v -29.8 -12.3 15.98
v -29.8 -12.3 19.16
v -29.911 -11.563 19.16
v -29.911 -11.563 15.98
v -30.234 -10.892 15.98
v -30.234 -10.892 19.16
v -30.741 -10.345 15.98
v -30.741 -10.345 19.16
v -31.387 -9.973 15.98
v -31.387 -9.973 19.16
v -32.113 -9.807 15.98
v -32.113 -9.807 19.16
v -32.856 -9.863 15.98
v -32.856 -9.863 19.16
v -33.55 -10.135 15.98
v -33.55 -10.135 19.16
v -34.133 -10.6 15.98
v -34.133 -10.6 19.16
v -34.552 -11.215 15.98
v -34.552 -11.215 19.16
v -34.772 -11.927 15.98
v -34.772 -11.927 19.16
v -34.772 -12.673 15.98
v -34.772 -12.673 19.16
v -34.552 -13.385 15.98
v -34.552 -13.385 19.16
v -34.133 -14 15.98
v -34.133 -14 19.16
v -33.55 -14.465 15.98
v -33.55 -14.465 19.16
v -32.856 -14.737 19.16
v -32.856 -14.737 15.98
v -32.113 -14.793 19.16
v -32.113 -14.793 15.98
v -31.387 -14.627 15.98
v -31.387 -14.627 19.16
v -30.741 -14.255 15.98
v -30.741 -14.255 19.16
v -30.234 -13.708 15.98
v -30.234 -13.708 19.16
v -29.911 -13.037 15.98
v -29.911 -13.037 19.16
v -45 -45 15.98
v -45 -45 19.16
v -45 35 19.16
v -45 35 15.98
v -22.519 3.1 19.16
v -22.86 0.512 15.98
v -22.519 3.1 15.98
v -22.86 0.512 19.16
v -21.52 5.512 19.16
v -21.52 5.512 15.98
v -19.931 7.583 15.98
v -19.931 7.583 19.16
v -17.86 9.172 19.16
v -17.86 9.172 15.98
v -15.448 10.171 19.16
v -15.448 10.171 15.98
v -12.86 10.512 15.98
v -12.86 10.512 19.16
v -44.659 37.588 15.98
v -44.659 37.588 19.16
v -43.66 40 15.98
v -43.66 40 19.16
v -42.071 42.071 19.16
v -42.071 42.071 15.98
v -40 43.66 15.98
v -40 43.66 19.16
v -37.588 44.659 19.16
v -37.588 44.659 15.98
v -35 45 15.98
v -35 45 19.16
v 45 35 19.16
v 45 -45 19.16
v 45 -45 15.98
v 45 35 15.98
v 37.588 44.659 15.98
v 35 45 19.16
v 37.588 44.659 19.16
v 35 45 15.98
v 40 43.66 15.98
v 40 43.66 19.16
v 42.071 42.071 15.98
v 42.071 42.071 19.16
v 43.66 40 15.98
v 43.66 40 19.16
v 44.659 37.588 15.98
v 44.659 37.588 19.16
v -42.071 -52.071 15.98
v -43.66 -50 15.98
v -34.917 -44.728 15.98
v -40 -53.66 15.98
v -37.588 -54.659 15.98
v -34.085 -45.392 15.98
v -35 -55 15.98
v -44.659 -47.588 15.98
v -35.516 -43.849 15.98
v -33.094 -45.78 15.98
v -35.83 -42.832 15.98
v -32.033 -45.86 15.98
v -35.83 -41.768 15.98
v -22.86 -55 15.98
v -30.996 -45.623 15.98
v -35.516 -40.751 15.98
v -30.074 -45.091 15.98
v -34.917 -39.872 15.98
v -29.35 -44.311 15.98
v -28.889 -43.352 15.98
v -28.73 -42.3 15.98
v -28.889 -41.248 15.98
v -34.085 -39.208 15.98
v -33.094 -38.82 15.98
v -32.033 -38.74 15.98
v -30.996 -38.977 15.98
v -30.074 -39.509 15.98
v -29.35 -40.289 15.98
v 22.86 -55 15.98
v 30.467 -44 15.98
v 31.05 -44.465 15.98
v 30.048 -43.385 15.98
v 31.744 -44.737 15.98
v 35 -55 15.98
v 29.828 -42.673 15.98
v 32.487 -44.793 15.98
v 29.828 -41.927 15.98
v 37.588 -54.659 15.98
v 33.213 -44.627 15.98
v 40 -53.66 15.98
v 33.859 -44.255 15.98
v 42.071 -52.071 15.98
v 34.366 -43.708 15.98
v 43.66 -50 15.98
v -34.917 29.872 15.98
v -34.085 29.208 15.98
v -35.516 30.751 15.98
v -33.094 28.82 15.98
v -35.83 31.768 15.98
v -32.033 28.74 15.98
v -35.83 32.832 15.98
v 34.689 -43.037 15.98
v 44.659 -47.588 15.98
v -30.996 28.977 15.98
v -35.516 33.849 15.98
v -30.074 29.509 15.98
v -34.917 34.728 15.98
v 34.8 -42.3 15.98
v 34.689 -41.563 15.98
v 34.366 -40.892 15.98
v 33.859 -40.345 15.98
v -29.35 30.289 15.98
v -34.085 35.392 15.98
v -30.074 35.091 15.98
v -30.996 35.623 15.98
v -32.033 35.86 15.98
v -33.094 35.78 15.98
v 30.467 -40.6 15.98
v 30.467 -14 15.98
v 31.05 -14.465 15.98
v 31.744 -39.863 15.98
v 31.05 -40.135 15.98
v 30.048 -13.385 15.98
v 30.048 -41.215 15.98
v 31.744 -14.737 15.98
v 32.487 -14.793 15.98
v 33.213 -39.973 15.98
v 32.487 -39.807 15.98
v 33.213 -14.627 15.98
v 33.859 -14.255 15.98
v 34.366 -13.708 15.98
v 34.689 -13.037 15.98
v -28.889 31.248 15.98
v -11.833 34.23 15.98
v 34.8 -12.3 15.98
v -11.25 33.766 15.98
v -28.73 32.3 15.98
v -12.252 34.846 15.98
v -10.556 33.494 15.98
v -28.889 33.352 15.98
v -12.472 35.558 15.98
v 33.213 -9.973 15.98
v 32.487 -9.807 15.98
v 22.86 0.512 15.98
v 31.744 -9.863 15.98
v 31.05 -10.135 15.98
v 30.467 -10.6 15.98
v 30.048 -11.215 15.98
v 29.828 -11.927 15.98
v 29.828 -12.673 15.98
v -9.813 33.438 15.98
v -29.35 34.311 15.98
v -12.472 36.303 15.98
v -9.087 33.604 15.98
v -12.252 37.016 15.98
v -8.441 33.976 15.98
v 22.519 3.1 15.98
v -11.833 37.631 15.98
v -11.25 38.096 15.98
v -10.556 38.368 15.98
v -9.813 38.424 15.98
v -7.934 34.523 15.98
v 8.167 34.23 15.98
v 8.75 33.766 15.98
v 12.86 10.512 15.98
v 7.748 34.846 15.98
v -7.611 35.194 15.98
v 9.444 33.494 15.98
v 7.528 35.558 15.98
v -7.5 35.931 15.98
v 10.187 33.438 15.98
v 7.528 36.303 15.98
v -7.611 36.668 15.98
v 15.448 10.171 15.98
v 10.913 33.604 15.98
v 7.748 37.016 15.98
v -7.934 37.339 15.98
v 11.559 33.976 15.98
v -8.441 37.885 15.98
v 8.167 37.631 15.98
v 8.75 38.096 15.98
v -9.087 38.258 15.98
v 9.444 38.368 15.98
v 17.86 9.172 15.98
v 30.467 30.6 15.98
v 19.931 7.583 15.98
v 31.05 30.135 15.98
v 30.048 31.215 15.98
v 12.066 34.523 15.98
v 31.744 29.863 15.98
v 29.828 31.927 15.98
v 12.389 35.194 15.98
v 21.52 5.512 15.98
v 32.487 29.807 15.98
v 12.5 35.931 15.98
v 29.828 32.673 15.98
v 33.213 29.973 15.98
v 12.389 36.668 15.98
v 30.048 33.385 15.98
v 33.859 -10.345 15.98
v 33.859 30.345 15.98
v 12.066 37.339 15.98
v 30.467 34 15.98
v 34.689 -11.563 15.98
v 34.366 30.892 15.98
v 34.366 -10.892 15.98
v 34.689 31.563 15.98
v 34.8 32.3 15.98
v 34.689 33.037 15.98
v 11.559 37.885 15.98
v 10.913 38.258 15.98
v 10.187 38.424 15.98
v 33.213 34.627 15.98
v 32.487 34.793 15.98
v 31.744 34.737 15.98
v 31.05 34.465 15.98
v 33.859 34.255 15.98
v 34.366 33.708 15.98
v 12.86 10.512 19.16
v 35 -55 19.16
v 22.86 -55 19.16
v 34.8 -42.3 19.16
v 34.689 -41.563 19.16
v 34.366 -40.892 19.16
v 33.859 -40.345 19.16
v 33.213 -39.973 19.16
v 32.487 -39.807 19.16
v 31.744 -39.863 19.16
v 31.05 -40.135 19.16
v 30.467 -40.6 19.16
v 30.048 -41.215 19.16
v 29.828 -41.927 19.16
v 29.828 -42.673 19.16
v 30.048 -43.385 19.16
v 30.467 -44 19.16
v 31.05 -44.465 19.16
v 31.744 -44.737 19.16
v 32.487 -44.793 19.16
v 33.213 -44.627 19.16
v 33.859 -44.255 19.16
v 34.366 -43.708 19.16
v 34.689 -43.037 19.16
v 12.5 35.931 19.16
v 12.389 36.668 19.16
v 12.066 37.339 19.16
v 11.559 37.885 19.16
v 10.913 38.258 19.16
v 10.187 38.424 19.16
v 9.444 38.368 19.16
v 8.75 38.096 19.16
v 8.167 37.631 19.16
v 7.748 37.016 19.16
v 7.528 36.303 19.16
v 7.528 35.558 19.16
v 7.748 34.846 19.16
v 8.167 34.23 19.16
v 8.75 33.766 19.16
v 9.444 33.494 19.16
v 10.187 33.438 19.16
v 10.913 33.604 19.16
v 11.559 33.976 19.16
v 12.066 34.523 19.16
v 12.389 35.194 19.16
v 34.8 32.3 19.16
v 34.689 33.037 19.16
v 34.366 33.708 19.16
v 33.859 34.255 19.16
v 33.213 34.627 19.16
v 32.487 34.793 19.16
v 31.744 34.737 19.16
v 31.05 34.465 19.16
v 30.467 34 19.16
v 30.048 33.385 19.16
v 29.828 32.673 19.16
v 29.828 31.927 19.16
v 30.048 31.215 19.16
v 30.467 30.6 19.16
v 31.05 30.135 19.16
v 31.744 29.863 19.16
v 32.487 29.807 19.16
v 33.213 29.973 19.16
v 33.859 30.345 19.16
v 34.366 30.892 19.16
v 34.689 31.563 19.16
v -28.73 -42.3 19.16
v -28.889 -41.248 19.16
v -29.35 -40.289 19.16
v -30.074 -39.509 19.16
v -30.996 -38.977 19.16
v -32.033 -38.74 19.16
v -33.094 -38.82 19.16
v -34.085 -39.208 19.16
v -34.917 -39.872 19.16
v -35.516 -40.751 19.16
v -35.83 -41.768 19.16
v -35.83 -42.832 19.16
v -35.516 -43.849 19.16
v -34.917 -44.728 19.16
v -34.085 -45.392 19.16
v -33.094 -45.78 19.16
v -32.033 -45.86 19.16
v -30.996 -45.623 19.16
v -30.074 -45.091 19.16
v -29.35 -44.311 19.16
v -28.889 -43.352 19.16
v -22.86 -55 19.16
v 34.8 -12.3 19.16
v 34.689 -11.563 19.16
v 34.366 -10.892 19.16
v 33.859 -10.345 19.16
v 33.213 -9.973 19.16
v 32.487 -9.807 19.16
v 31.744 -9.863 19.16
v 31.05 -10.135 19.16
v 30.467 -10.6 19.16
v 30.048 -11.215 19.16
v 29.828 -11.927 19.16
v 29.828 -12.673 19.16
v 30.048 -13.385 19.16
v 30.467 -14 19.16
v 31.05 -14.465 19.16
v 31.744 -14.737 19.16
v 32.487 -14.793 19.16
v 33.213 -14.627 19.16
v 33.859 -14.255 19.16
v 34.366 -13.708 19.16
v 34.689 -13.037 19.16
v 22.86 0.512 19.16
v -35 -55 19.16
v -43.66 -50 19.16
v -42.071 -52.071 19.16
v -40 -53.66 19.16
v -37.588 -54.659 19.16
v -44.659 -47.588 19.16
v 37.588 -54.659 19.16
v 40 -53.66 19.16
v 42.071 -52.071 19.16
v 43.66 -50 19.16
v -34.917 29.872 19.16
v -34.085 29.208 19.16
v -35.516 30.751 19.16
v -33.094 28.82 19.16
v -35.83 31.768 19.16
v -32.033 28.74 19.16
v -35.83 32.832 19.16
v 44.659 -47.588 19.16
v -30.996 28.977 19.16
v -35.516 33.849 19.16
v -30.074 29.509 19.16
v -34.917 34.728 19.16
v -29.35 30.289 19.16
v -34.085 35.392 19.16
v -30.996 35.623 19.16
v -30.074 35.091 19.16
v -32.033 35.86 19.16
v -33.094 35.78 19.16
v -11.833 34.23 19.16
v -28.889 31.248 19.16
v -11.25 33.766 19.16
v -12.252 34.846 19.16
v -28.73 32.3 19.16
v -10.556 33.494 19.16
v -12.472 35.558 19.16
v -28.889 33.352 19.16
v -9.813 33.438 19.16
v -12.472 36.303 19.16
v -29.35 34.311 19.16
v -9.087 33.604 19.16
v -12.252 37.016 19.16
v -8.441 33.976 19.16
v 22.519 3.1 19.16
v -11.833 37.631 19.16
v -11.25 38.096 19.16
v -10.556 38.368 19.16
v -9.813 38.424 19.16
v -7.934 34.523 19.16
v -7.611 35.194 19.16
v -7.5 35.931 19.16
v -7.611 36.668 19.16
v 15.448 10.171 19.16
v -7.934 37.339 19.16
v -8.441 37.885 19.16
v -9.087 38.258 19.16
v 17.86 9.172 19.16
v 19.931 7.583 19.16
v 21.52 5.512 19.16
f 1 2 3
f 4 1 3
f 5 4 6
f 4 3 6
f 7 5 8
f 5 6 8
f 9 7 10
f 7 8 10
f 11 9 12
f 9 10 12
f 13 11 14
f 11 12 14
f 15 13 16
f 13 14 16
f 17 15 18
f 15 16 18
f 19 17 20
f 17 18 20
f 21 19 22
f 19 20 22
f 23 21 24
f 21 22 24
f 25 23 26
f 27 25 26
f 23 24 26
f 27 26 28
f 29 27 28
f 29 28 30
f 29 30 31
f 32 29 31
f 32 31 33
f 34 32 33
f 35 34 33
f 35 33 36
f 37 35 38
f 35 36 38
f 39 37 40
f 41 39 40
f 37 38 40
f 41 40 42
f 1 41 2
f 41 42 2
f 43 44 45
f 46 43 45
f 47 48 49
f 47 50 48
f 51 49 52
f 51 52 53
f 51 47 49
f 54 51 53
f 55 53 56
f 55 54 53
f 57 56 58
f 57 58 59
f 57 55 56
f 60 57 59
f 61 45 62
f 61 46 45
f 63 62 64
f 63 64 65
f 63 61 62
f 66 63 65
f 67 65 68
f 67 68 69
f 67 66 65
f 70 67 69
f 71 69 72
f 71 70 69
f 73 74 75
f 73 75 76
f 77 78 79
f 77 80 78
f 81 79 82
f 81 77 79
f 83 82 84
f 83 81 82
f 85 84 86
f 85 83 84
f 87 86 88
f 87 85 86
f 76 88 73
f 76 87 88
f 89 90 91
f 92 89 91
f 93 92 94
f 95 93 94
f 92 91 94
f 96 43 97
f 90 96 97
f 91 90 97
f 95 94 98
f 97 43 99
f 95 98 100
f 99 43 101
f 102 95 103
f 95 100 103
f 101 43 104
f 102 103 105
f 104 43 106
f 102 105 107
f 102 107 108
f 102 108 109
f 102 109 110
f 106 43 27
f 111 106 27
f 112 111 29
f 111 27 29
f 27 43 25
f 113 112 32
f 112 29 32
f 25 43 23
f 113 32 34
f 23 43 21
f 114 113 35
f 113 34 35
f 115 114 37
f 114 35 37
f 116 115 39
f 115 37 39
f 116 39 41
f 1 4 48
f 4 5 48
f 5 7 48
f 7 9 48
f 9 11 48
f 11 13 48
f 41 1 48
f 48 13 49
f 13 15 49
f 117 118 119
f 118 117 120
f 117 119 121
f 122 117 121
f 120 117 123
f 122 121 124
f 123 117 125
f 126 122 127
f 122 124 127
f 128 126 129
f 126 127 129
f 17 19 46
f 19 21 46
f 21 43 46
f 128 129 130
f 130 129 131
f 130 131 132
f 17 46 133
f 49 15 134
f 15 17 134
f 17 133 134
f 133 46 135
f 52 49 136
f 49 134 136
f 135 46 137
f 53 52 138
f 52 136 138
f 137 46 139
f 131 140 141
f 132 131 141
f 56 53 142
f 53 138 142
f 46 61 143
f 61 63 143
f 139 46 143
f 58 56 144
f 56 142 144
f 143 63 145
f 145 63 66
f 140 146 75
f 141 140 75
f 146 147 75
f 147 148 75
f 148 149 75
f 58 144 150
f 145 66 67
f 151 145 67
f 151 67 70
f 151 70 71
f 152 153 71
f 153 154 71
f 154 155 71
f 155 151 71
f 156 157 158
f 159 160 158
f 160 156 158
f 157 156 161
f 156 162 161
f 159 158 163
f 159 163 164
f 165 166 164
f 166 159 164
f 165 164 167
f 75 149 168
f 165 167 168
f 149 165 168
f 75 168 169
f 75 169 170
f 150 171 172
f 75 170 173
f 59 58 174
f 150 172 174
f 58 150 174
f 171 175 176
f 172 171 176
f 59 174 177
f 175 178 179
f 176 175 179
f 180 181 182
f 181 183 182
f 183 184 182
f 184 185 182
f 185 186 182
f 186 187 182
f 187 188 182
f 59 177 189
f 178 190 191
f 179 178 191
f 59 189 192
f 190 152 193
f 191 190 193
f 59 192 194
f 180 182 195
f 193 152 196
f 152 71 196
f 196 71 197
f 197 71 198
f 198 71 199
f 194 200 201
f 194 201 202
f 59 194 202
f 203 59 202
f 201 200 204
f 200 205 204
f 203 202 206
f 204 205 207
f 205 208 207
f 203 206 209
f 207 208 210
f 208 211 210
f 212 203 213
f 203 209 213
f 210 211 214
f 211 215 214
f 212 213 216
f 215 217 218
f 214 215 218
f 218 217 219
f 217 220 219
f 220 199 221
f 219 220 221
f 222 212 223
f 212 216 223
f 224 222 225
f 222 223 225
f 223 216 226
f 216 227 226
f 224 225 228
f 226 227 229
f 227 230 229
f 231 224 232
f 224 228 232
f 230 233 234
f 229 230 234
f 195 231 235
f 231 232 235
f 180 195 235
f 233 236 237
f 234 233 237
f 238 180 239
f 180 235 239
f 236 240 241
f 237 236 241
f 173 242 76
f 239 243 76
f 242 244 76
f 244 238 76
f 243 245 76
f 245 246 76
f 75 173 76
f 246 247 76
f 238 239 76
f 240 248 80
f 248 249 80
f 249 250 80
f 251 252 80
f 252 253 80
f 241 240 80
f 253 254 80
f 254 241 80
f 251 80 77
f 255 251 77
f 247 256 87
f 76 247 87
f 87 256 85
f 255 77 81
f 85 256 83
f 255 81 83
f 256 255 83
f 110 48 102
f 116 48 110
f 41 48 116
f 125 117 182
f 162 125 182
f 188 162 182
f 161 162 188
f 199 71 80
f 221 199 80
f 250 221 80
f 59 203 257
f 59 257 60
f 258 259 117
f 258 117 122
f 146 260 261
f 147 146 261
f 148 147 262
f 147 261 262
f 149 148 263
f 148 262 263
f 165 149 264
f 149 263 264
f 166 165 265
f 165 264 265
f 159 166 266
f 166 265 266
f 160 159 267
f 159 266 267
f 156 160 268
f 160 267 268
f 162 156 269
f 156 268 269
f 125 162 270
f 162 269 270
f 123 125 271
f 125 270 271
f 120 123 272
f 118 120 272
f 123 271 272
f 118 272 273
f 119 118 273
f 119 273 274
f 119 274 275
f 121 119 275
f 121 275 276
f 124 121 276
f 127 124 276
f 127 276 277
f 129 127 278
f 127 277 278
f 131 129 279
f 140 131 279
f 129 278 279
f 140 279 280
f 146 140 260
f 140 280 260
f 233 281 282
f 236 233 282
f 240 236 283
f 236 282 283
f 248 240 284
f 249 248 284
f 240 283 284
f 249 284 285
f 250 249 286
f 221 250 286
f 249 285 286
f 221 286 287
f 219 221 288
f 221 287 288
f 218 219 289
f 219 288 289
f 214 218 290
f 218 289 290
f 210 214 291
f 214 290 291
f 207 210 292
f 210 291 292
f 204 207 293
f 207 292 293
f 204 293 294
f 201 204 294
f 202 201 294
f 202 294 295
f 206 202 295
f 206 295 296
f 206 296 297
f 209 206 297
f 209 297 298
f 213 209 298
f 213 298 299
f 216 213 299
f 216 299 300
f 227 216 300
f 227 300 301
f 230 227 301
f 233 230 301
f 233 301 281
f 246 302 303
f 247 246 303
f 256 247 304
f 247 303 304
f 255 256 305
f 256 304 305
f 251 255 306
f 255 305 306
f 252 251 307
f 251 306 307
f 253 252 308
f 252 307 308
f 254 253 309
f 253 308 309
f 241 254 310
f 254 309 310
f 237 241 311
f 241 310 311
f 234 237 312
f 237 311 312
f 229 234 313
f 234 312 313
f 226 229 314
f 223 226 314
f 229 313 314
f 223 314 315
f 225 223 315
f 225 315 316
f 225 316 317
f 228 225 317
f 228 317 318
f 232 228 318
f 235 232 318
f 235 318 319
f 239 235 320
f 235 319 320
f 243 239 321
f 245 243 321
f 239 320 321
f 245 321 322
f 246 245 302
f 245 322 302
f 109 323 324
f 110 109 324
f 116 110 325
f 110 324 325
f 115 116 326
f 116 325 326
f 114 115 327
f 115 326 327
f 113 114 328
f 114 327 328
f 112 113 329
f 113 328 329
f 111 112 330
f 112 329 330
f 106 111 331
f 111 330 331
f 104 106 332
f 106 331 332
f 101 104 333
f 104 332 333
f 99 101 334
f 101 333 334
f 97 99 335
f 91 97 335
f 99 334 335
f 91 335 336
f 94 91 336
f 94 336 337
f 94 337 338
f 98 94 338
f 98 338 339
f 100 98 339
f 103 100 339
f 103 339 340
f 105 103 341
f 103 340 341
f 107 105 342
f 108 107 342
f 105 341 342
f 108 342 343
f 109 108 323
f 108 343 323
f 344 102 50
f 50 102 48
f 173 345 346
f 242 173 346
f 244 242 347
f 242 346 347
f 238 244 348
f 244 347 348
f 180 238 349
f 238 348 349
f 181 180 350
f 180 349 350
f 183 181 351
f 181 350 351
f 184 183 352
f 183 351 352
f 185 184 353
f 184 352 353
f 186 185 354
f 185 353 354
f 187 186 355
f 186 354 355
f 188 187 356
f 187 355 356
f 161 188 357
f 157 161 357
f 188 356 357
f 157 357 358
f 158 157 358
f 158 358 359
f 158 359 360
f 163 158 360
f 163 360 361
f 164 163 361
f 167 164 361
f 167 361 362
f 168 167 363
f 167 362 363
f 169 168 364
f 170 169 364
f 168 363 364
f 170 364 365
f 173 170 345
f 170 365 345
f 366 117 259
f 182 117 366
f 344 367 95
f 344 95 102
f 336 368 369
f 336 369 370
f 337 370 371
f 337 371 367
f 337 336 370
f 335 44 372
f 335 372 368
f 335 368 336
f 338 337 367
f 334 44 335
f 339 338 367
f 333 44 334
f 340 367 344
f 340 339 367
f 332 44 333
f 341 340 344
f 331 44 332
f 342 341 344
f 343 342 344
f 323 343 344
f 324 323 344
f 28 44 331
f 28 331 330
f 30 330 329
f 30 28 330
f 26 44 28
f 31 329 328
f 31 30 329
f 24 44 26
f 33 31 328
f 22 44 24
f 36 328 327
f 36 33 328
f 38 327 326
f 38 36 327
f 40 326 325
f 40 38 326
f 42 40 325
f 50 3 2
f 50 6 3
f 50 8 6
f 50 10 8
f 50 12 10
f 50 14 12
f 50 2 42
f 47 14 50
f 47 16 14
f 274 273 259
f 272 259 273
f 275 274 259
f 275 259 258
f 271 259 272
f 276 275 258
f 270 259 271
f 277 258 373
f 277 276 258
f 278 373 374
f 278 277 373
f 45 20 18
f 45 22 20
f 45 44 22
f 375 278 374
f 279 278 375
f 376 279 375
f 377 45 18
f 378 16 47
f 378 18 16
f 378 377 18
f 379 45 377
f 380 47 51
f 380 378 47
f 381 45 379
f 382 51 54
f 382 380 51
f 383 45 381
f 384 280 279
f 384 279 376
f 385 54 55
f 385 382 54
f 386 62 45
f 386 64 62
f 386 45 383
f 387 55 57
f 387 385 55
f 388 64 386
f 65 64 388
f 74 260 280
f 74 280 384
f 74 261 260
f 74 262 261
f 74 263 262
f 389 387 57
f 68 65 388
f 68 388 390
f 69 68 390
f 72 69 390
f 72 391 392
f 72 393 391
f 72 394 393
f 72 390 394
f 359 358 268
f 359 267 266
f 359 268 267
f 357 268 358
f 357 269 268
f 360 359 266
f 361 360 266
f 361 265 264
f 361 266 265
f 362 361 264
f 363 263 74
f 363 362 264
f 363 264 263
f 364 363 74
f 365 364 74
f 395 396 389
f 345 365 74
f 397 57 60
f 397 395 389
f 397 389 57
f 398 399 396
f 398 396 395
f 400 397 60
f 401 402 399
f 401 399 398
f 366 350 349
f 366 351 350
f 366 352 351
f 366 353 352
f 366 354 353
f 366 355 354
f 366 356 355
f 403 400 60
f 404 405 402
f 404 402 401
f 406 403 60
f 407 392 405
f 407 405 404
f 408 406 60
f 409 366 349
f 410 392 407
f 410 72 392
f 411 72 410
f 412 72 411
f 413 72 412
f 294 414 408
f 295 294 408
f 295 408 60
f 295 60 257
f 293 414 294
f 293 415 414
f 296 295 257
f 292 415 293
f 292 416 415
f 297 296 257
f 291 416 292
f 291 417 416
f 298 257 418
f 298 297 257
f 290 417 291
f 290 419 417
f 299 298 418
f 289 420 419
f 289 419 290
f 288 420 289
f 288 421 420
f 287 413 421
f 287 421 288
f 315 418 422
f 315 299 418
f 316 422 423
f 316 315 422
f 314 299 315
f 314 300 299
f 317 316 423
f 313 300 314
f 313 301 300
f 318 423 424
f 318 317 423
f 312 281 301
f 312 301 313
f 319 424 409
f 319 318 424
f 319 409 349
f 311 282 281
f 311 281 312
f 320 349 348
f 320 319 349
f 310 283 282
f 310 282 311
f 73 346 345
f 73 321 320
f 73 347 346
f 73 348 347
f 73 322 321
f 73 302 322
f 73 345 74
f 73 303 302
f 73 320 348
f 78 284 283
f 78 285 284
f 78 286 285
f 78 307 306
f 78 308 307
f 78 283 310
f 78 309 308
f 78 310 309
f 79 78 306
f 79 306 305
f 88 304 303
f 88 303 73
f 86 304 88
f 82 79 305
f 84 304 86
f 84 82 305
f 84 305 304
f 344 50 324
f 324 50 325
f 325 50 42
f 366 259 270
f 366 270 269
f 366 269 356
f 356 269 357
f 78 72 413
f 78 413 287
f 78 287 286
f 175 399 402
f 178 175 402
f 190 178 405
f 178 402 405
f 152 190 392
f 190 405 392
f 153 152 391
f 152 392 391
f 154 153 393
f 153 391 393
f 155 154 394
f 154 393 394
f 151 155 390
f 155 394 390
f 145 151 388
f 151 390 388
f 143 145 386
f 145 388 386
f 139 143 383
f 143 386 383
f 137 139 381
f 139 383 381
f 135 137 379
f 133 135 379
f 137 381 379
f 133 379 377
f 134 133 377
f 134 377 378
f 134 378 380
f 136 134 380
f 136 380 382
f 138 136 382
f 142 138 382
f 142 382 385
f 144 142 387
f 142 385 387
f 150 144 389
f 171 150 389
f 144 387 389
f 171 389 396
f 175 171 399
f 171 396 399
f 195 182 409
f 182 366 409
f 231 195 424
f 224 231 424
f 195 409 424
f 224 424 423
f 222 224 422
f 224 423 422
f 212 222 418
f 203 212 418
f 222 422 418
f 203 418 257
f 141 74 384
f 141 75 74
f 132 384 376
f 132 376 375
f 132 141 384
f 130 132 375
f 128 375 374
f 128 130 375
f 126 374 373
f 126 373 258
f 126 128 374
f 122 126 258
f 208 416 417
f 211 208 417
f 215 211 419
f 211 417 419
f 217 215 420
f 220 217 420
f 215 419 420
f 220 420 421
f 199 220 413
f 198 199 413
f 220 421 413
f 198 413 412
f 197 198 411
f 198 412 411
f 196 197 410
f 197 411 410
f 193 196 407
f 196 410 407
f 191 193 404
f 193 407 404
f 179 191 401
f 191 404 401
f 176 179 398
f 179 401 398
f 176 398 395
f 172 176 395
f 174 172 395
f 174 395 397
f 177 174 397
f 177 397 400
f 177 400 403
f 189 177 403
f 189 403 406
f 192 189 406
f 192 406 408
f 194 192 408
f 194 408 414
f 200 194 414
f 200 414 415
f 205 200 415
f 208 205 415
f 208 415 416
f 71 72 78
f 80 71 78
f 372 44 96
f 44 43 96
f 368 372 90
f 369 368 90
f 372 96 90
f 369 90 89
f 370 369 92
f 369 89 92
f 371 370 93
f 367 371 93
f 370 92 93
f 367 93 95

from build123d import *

# Parameters (mm, degrees)
BOSS_EXTRUDE1_START = 19.16
SKETCH1_W           = 90
SKETCH1_H           = 100
SKETCH1_R           = 2.5
SKETCH1_R_2         = 3.57
BOSS_EXTRUDE1_DEPTH = 3.18
SKETCH2_W           = 45.72
SKETCH2_H           = 65.511870912
CUT_EXTRUDE1_DEPTH  = 72.134467033
FILLET1_R           = 10
SKETCH3_R           = 2.5
CUT_EXTRUDE2_DEPTH  = 72.134467033


with BuildPart() as part:
    # Sketch1 → Boss-Extrude1 (new body)
    with BuildSketch(Plane.XY.offset(BOSS_EXTRUDE1_START)):
        with Locations((0, -5)):
            Rectangle(SKETCH1_W, SKETCH1_H)
        with Locations((32.3, -12.3)):
            Circle(SKETCH1_R, mode=Mode.SUBTRACT)
        with Locations((32.3, -42.3)):
            Circle(SKETCH1_R, mode=Mode.SUBTRACT)
        with Locations((-32.3, -42.3)):
            Circle(SKETCH1_R_2, mode=Mode.SUBTRACT)
        with Locations((-32.3, -12.3)):
            Circle(SKETCH1_R, mode=Mode.SUBTRACT)
        with Locations((-32.3, 32.3)):
            Circle(SKETCH1_R_2, mode=Mode.SUBTRACT)
        with Locations((32.3, 32.3)):
            Circle(SKETCH1_R, mode=Mode.SUBTRACT)
    extrude(amount=-BOSS_EXTRUDE1_DEPTH)

    # Sketch2 → Cut-Extrude1 (cut, through all)
    with BuildSketch(Plane(origin=(0, 0, 15.98), x_dir=(-1, 0, 0), z_dir=(0, 0, -1))):
        with Locations((0, -22.244064544)):
            Rectangle(SKETCH2_W, SKETCH2_H)
    extrude(amount=-CUT_EXTRUDE1_DEPTH, mode=Mode.SUBTRACT)

    # Fillet1
    fillet1_edges = [part.edges().sort_by_distance(p)[0] for p in [
        (22.86, 10.511870912, 17.57),
        (-22.86, 10.511870912, 17.57),
        (-45, 45, 17.57),
        (45, 45, 17.57),
        (45, -55, 17.57),
        (-45, -55, 17.57),
    ]]
    fillet(fillet1_edges, radius=FILLET1_R)

    # Sketch3 → Cut-Extrude2 (cut, through all)
    with BuildSketch(Plane.XY.offset(19.16)):
        with Locations((10, 35.930865744)):
            Circle(SKETCH3_R)
        with Locations((-10, 35.930865744)):
            Circle(SKETCH3_R)
    extrude(amount=-CUT_EXTRUDE2_DEPTH, mode=Mode.SUBTRACT)


solid = part.part
